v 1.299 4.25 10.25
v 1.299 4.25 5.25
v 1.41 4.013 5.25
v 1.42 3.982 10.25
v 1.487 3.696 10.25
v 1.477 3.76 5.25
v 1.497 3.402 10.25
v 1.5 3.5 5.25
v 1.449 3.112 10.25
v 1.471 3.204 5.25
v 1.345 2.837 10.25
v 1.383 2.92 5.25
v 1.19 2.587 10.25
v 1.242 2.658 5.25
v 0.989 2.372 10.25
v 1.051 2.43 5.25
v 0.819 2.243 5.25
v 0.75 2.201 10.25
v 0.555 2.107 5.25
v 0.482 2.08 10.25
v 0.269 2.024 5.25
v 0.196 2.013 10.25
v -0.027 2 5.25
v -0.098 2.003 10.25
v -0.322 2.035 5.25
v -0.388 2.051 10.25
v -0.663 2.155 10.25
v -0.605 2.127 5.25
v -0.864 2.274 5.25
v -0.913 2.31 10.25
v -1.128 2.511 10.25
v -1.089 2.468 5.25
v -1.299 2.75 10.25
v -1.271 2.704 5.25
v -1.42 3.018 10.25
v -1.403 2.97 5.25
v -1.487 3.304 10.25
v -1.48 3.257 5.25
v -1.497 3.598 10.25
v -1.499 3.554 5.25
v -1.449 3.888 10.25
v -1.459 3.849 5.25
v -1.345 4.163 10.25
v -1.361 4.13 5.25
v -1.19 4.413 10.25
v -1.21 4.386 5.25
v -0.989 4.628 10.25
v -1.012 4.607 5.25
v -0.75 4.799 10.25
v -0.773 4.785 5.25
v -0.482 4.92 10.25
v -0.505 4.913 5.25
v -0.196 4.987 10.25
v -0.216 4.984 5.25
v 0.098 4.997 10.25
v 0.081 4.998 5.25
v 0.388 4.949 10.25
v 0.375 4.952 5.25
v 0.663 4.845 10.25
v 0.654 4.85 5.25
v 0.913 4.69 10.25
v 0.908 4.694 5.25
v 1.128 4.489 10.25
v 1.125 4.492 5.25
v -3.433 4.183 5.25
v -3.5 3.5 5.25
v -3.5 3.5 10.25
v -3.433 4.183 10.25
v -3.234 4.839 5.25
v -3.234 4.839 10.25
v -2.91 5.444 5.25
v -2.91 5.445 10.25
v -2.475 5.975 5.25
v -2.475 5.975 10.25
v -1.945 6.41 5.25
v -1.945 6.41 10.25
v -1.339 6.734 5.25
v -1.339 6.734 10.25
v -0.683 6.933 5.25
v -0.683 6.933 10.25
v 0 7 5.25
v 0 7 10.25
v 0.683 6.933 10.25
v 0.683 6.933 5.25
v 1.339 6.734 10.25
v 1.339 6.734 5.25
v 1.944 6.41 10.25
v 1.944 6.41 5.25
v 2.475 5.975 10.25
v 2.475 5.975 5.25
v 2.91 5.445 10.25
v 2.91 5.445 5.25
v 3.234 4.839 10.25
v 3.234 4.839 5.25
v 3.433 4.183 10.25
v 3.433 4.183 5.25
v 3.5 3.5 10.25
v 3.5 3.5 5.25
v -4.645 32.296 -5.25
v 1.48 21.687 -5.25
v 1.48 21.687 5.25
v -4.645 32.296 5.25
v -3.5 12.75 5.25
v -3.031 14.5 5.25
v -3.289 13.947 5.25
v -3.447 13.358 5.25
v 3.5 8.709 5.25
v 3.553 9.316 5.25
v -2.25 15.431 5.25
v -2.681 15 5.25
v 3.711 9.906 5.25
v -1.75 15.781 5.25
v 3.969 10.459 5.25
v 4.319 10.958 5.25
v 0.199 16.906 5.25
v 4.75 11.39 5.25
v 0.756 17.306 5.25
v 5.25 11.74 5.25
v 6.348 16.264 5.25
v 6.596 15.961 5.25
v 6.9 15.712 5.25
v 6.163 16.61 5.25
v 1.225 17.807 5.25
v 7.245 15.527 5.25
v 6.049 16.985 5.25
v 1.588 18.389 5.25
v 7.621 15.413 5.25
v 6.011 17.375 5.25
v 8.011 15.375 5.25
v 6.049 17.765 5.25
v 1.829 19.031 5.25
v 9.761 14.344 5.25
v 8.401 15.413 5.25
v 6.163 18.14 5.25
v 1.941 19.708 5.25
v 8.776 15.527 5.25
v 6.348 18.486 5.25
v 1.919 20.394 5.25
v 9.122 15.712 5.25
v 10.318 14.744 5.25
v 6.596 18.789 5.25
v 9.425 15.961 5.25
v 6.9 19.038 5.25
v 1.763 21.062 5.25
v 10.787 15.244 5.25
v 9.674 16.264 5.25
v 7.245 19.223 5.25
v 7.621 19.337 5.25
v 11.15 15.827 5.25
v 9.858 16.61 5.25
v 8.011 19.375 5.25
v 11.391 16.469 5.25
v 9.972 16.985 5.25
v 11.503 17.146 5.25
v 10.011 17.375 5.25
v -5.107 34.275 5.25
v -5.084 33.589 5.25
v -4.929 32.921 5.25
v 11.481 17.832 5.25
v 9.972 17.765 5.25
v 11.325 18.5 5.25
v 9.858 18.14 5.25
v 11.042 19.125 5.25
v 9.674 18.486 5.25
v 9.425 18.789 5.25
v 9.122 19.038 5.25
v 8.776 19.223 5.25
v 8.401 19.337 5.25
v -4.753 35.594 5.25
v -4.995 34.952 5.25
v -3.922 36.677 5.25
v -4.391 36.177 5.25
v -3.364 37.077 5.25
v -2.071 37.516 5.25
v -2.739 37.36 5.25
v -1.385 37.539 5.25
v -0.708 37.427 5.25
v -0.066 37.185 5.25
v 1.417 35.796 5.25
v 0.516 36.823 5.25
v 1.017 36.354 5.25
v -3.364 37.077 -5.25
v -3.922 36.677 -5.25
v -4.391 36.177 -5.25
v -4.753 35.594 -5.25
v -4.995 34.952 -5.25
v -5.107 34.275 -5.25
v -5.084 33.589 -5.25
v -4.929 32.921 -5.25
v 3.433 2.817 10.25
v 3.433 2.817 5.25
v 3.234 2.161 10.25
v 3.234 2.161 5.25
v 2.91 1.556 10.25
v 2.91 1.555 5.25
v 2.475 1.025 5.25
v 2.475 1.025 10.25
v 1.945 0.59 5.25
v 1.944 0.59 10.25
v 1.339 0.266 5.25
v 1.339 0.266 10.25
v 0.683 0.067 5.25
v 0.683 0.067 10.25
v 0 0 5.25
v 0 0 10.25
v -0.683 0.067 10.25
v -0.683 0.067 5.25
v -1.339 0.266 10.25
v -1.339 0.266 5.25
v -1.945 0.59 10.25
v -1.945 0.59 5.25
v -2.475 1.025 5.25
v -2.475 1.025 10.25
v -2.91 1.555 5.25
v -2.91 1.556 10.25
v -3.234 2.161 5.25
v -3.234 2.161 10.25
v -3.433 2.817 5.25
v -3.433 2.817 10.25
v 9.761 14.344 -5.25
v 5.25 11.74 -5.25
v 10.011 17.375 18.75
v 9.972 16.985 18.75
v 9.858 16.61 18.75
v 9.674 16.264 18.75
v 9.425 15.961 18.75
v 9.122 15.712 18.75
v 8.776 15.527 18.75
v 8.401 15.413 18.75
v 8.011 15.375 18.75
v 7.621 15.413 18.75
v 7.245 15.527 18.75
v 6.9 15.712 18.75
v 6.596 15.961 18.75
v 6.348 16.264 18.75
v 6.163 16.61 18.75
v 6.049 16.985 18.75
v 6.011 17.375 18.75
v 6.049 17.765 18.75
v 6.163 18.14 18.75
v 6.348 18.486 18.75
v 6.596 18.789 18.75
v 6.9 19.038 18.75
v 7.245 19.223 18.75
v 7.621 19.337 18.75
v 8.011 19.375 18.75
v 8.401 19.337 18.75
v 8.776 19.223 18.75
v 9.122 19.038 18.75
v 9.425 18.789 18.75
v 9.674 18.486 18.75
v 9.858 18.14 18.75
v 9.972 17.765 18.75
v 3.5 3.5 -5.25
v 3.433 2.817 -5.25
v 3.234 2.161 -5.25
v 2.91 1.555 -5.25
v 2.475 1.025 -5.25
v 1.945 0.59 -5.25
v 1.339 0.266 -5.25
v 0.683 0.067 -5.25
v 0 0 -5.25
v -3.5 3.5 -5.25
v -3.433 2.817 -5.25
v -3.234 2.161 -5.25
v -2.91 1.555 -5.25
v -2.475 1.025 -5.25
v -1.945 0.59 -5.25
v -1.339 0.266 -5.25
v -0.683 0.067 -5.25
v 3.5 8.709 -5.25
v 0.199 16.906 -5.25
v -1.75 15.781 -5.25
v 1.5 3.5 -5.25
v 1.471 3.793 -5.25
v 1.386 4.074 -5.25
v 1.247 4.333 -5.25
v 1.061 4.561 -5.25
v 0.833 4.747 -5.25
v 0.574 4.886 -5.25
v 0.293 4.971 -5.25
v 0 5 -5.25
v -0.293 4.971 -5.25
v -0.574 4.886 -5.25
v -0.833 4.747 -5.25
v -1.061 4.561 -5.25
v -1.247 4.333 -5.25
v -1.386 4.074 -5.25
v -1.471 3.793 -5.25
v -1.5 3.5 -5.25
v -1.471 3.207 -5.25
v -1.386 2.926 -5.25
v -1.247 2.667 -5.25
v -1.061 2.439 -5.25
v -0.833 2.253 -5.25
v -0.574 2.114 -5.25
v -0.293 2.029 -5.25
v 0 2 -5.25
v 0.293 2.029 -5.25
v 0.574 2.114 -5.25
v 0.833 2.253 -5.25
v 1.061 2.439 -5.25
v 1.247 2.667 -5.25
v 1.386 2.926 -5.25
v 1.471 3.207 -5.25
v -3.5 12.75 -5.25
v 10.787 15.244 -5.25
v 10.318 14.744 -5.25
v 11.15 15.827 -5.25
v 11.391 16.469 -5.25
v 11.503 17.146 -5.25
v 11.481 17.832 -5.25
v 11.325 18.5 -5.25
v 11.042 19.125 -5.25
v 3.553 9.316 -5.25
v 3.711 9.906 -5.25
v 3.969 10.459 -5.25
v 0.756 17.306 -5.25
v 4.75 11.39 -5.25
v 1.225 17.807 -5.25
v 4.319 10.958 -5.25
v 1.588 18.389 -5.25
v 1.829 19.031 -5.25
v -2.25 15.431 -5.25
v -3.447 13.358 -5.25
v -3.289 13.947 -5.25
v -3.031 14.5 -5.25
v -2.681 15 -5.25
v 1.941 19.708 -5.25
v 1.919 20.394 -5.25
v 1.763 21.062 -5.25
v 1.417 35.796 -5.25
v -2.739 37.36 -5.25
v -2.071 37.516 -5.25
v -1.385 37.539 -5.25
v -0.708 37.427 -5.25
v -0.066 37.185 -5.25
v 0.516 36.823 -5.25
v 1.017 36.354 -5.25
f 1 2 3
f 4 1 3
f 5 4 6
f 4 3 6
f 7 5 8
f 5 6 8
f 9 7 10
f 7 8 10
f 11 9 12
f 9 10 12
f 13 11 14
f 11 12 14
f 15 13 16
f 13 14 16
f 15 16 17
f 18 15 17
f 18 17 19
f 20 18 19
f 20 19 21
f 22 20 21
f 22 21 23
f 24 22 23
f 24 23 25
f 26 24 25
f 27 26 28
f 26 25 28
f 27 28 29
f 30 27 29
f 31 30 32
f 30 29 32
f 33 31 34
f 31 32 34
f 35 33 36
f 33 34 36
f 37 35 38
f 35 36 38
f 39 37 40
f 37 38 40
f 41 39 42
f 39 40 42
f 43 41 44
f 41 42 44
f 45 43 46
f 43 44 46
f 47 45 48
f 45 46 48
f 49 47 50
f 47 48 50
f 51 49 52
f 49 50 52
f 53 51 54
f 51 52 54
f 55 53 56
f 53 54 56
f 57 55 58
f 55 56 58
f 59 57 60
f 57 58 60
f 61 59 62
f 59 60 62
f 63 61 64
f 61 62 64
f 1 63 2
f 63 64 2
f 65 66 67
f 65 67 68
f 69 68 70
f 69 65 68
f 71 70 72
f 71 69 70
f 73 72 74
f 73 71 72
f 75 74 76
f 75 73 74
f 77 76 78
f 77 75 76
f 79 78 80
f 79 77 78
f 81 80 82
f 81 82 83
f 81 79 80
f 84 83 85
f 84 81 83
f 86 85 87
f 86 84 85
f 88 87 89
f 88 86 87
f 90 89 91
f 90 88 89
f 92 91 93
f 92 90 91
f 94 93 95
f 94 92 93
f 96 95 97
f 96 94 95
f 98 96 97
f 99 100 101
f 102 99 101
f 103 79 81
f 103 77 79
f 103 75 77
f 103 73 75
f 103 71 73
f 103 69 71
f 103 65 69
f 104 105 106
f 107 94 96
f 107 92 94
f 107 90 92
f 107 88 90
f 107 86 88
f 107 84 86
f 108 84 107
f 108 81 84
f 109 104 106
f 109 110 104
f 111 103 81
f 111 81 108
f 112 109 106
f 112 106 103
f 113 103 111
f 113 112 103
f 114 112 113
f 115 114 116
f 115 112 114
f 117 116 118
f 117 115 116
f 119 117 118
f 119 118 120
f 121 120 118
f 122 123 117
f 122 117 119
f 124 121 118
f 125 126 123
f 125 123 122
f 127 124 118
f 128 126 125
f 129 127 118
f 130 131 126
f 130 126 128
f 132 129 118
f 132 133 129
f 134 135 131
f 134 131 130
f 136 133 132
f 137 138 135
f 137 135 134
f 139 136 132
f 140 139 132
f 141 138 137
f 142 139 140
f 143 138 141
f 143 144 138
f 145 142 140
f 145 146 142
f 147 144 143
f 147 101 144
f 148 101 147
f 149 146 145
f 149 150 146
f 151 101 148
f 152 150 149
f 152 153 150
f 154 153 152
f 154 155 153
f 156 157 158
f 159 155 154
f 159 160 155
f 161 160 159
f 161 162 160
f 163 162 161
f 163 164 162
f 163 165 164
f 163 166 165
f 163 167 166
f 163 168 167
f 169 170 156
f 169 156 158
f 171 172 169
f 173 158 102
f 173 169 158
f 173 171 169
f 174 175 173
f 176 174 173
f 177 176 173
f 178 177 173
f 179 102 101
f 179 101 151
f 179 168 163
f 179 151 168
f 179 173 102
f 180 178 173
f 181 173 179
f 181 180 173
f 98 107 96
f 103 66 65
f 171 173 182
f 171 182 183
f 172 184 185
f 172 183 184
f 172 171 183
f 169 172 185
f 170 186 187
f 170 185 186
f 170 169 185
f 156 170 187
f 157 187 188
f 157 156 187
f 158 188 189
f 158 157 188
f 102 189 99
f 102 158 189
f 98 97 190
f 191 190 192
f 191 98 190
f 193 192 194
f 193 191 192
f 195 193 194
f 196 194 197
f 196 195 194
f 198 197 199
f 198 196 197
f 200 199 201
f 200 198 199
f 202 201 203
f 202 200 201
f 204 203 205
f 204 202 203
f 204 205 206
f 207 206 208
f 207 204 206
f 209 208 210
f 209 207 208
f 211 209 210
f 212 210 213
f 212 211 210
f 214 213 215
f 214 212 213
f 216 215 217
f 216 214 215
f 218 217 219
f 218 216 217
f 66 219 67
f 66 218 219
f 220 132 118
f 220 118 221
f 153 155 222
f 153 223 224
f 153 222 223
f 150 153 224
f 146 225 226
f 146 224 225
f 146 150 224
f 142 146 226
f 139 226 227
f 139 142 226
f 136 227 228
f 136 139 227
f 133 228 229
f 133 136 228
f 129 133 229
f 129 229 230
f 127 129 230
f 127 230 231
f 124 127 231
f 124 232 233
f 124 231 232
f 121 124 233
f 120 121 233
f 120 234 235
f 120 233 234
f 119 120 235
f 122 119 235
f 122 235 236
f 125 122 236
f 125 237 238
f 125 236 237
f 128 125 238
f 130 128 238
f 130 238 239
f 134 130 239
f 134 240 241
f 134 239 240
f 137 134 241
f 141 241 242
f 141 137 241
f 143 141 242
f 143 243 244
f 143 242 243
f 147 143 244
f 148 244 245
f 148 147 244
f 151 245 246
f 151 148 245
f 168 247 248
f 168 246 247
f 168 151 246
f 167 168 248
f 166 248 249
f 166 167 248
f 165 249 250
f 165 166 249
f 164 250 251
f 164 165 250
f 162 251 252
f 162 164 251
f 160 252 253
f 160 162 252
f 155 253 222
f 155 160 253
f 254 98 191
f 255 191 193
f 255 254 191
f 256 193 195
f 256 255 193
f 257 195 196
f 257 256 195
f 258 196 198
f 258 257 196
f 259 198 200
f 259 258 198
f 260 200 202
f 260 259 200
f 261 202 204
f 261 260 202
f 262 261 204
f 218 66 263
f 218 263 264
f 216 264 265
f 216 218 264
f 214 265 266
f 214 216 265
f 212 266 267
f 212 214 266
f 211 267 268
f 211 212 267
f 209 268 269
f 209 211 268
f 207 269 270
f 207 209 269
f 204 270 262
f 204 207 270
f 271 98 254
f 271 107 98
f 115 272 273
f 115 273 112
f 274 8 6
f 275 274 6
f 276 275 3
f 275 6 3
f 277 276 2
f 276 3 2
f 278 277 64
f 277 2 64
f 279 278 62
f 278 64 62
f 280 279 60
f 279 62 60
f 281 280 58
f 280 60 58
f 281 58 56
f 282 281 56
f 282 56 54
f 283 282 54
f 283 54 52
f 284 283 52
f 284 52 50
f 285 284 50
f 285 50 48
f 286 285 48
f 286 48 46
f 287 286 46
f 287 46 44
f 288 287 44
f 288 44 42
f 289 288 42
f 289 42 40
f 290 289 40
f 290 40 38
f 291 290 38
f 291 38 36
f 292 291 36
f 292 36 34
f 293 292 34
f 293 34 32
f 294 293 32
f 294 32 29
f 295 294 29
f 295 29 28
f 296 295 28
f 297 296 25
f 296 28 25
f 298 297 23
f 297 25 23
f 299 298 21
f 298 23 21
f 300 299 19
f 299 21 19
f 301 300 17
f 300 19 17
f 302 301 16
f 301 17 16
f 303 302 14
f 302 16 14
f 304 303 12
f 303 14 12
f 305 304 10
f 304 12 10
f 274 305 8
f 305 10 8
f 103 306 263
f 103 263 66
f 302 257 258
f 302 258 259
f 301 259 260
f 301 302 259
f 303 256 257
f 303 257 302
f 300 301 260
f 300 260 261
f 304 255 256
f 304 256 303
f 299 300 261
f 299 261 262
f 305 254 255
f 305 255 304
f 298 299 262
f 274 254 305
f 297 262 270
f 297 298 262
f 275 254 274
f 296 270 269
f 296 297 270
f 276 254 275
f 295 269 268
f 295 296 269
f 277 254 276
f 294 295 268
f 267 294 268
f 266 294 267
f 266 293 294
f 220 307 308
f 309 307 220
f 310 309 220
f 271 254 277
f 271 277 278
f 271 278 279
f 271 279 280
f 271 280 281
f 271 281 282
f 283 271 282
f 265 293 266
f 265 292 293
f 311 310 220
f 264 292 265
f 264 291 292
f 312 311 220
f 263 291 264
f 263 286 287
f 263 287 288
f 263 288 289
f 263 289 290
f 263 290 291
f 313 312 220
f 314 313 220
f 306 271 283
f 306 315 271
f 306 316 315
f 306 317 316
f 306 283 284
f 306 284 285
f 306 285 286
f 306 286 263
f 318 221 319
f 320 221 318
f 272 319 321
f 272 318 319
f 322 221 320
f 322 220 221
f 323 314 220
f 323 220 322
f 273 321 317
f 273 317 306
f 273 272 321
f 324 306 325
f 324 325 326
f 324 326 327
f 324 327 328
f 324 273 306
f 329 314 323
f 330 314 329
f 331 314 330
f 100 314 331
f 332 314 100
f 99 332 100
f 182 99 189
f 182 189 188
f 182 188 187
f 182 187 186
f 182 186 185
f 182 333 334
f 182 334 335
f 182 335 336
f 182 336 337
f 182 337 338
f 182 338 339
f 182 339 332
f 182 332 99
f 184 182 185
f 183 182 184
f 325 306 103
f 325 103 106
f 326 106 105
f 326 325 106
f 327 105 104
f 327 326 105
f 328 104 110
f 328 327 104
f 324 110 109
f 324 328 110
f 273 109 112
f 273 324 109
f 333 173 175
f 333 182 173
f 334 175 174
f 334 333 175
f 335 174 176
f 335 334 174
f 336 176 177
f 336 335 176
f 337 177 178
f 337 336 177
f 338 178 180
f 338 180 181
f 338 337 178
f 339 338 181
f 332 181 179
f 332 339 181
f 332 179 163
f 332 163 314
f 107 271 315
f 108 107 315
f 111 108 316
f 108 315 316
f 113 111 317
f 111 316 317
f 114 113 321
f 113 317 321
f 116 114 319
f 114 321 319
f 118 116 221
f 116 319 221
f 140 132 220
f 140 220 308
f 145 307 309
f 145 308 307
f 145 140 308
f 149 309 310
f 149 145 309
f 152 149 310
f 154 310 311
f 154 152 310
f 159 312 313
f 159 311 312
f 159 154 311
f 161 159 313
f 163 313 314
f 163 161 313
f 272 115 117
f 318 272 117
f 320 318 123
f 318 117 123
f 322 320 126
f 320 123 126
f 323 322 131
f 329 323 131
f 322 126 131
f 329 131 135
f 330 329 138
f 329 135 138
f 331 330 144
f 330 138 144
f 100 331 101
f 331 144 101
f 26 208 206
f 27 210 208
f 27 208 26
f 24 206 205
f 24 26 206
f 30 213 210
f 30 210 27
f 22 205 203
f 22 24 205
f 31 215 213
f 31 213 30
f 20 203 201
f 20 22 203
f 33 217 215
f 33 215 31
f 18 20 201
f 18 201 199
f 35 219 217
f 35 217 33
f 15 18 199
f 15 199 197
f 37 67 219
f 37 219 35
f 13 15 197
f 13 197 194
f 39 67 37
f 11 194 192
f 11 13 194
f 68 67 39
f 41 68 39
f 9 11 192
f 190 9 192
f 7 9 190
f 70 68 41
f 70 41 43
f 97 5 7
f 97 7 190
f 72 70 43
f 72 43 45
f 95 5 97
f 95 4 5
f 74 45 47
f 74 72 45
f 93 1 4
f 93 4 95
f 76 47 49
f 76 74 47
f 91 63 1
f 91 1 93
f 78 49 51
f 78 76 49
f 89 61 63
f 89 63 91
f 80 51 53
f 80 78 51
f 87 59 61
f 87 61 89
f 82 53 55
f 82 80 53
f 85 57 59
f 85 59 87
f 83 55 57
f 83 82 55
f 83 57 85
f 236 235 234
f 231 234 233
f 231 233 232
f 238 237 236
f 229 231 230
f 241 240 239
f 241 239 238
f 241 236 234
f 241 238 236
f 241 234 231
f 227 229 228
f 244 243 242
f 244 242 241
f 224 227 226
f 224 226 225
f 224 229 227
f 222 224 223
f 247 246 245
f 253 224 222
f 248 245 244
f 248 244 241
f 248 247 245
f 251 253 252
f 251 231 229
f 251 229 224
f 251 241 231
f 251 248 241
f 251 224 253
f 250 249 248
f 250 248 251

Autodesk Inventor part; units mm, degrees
ref_plane "YZ Plane" through (0, 0, 0) normal (1, 0, 0) x (0, 1, 0)
ref_plane "XZ Plane" through (0, 0, 0) normal (0, 1, 0) x (-1, 0, 0)
ref_plane "XY Plane" through (0, 0, 0) normal (0, 0, 1) x (1, 0, 0)
sketch "Sketch2" plane through (0, 0, 0) normal (0, 1, 0) x (-1, 0, 0)
  line L0 (3.5, -5.25) -> (-3.5, -5.25)
  line L1 (-3.5, -5.25) -> (-3.5, 5.25)
  line L2 (-3.5, 5.25) -> (3.5, 5.25)
  line L3 (3.5, 5.25) -> (3.5, -5.25)
  line L4 (3.5, -5.25) -> (-3.5, 5.25) construction
  line L5 (-3.5, -5.25) -> (3.5, 5.25) construction
  point P0 (0, 0)
  dimension "d11" = 10.5
  dimension "d12" = 7
sketch "Sketch3" plane through (0, 0, 0) normal (0, 0, 1) x (1, 0, 0)
  line L0 (0, 0) -> (0, 12.75)
  line L1 (0, 12.75) -> (8.0107, 17.375)
  line L2 (8.0107, 17.375) -> (-3.3643, 37.0771)
  dimension "d13" = 12.75
  dimension "d14" = 9.25
  dimension "d15" = 120
  dimension "d16" = 22.75
  dimension "d30" = 90
sweep "Sweep1" add profiles "Sketch2" path "Sketch3"
sketch "Sketch4" plane through (-3.5, 0, 5.25) normal (0, 0, 1) x (1, 0, 0)
  line L0 (7, 0) -> (0, 0) projected
  circle A0 centre (3.5, 3.5) radius 1.5
  point P0 (3.5, 0)
  point P1 (3.5, 0)
  dimension "d19" = 3
  dimension "d20" = 3.5
extrude "Extrusion1" cut sketch "Sketch4" against normal blind 11.5
sketch "Sketch5" plane through (-3.5, 0, 5.25) normal (0, 0, 1) x (1, 0, 0)
  line L0 (6.7296, 18.6561) -> (16.2918, 16.0939) construction
  circle A0 centre (11.5107, 17.375) radius 2
  point P0 (3.5, 0)
  dimension "d24" = 4
extrude "Extrusion2" add sketch "Sketch5" along normal blind 13.5
fillet "Fillet2" radius 3.5 8 edges at (3.5, 0, 0) (-3.5, 0, 0) (3.5, 10.7293, 0) (-0.3332, 38.8271, 0) (12.7918, 16.0939, 0) (-3.5, 14.7707, 0) (3.2296, 18.6561, 0) (-6.3954, 35.3271, 0)
sketch "Sketch6" plane through (-1.6143, 34.046, 5.25) normal (0, 0, 1) x (0.8660254, 0.5, 0)
  circle A0 centre (-13.875, -27.2607) radius 1.5 projected
  arc A1 (-16.9061, -25.5107) -> (-10.8439, -29.0107) centre (-13.875, -27.2607) ccw projected
  circle A2 centre (-13.875, -27.2607) radius 3.5
  point P0 (-15.625, -30.2918)
extrude "Extrusion3" add sketch "Sketch6" along normal blind 5
properties part number "arm"
